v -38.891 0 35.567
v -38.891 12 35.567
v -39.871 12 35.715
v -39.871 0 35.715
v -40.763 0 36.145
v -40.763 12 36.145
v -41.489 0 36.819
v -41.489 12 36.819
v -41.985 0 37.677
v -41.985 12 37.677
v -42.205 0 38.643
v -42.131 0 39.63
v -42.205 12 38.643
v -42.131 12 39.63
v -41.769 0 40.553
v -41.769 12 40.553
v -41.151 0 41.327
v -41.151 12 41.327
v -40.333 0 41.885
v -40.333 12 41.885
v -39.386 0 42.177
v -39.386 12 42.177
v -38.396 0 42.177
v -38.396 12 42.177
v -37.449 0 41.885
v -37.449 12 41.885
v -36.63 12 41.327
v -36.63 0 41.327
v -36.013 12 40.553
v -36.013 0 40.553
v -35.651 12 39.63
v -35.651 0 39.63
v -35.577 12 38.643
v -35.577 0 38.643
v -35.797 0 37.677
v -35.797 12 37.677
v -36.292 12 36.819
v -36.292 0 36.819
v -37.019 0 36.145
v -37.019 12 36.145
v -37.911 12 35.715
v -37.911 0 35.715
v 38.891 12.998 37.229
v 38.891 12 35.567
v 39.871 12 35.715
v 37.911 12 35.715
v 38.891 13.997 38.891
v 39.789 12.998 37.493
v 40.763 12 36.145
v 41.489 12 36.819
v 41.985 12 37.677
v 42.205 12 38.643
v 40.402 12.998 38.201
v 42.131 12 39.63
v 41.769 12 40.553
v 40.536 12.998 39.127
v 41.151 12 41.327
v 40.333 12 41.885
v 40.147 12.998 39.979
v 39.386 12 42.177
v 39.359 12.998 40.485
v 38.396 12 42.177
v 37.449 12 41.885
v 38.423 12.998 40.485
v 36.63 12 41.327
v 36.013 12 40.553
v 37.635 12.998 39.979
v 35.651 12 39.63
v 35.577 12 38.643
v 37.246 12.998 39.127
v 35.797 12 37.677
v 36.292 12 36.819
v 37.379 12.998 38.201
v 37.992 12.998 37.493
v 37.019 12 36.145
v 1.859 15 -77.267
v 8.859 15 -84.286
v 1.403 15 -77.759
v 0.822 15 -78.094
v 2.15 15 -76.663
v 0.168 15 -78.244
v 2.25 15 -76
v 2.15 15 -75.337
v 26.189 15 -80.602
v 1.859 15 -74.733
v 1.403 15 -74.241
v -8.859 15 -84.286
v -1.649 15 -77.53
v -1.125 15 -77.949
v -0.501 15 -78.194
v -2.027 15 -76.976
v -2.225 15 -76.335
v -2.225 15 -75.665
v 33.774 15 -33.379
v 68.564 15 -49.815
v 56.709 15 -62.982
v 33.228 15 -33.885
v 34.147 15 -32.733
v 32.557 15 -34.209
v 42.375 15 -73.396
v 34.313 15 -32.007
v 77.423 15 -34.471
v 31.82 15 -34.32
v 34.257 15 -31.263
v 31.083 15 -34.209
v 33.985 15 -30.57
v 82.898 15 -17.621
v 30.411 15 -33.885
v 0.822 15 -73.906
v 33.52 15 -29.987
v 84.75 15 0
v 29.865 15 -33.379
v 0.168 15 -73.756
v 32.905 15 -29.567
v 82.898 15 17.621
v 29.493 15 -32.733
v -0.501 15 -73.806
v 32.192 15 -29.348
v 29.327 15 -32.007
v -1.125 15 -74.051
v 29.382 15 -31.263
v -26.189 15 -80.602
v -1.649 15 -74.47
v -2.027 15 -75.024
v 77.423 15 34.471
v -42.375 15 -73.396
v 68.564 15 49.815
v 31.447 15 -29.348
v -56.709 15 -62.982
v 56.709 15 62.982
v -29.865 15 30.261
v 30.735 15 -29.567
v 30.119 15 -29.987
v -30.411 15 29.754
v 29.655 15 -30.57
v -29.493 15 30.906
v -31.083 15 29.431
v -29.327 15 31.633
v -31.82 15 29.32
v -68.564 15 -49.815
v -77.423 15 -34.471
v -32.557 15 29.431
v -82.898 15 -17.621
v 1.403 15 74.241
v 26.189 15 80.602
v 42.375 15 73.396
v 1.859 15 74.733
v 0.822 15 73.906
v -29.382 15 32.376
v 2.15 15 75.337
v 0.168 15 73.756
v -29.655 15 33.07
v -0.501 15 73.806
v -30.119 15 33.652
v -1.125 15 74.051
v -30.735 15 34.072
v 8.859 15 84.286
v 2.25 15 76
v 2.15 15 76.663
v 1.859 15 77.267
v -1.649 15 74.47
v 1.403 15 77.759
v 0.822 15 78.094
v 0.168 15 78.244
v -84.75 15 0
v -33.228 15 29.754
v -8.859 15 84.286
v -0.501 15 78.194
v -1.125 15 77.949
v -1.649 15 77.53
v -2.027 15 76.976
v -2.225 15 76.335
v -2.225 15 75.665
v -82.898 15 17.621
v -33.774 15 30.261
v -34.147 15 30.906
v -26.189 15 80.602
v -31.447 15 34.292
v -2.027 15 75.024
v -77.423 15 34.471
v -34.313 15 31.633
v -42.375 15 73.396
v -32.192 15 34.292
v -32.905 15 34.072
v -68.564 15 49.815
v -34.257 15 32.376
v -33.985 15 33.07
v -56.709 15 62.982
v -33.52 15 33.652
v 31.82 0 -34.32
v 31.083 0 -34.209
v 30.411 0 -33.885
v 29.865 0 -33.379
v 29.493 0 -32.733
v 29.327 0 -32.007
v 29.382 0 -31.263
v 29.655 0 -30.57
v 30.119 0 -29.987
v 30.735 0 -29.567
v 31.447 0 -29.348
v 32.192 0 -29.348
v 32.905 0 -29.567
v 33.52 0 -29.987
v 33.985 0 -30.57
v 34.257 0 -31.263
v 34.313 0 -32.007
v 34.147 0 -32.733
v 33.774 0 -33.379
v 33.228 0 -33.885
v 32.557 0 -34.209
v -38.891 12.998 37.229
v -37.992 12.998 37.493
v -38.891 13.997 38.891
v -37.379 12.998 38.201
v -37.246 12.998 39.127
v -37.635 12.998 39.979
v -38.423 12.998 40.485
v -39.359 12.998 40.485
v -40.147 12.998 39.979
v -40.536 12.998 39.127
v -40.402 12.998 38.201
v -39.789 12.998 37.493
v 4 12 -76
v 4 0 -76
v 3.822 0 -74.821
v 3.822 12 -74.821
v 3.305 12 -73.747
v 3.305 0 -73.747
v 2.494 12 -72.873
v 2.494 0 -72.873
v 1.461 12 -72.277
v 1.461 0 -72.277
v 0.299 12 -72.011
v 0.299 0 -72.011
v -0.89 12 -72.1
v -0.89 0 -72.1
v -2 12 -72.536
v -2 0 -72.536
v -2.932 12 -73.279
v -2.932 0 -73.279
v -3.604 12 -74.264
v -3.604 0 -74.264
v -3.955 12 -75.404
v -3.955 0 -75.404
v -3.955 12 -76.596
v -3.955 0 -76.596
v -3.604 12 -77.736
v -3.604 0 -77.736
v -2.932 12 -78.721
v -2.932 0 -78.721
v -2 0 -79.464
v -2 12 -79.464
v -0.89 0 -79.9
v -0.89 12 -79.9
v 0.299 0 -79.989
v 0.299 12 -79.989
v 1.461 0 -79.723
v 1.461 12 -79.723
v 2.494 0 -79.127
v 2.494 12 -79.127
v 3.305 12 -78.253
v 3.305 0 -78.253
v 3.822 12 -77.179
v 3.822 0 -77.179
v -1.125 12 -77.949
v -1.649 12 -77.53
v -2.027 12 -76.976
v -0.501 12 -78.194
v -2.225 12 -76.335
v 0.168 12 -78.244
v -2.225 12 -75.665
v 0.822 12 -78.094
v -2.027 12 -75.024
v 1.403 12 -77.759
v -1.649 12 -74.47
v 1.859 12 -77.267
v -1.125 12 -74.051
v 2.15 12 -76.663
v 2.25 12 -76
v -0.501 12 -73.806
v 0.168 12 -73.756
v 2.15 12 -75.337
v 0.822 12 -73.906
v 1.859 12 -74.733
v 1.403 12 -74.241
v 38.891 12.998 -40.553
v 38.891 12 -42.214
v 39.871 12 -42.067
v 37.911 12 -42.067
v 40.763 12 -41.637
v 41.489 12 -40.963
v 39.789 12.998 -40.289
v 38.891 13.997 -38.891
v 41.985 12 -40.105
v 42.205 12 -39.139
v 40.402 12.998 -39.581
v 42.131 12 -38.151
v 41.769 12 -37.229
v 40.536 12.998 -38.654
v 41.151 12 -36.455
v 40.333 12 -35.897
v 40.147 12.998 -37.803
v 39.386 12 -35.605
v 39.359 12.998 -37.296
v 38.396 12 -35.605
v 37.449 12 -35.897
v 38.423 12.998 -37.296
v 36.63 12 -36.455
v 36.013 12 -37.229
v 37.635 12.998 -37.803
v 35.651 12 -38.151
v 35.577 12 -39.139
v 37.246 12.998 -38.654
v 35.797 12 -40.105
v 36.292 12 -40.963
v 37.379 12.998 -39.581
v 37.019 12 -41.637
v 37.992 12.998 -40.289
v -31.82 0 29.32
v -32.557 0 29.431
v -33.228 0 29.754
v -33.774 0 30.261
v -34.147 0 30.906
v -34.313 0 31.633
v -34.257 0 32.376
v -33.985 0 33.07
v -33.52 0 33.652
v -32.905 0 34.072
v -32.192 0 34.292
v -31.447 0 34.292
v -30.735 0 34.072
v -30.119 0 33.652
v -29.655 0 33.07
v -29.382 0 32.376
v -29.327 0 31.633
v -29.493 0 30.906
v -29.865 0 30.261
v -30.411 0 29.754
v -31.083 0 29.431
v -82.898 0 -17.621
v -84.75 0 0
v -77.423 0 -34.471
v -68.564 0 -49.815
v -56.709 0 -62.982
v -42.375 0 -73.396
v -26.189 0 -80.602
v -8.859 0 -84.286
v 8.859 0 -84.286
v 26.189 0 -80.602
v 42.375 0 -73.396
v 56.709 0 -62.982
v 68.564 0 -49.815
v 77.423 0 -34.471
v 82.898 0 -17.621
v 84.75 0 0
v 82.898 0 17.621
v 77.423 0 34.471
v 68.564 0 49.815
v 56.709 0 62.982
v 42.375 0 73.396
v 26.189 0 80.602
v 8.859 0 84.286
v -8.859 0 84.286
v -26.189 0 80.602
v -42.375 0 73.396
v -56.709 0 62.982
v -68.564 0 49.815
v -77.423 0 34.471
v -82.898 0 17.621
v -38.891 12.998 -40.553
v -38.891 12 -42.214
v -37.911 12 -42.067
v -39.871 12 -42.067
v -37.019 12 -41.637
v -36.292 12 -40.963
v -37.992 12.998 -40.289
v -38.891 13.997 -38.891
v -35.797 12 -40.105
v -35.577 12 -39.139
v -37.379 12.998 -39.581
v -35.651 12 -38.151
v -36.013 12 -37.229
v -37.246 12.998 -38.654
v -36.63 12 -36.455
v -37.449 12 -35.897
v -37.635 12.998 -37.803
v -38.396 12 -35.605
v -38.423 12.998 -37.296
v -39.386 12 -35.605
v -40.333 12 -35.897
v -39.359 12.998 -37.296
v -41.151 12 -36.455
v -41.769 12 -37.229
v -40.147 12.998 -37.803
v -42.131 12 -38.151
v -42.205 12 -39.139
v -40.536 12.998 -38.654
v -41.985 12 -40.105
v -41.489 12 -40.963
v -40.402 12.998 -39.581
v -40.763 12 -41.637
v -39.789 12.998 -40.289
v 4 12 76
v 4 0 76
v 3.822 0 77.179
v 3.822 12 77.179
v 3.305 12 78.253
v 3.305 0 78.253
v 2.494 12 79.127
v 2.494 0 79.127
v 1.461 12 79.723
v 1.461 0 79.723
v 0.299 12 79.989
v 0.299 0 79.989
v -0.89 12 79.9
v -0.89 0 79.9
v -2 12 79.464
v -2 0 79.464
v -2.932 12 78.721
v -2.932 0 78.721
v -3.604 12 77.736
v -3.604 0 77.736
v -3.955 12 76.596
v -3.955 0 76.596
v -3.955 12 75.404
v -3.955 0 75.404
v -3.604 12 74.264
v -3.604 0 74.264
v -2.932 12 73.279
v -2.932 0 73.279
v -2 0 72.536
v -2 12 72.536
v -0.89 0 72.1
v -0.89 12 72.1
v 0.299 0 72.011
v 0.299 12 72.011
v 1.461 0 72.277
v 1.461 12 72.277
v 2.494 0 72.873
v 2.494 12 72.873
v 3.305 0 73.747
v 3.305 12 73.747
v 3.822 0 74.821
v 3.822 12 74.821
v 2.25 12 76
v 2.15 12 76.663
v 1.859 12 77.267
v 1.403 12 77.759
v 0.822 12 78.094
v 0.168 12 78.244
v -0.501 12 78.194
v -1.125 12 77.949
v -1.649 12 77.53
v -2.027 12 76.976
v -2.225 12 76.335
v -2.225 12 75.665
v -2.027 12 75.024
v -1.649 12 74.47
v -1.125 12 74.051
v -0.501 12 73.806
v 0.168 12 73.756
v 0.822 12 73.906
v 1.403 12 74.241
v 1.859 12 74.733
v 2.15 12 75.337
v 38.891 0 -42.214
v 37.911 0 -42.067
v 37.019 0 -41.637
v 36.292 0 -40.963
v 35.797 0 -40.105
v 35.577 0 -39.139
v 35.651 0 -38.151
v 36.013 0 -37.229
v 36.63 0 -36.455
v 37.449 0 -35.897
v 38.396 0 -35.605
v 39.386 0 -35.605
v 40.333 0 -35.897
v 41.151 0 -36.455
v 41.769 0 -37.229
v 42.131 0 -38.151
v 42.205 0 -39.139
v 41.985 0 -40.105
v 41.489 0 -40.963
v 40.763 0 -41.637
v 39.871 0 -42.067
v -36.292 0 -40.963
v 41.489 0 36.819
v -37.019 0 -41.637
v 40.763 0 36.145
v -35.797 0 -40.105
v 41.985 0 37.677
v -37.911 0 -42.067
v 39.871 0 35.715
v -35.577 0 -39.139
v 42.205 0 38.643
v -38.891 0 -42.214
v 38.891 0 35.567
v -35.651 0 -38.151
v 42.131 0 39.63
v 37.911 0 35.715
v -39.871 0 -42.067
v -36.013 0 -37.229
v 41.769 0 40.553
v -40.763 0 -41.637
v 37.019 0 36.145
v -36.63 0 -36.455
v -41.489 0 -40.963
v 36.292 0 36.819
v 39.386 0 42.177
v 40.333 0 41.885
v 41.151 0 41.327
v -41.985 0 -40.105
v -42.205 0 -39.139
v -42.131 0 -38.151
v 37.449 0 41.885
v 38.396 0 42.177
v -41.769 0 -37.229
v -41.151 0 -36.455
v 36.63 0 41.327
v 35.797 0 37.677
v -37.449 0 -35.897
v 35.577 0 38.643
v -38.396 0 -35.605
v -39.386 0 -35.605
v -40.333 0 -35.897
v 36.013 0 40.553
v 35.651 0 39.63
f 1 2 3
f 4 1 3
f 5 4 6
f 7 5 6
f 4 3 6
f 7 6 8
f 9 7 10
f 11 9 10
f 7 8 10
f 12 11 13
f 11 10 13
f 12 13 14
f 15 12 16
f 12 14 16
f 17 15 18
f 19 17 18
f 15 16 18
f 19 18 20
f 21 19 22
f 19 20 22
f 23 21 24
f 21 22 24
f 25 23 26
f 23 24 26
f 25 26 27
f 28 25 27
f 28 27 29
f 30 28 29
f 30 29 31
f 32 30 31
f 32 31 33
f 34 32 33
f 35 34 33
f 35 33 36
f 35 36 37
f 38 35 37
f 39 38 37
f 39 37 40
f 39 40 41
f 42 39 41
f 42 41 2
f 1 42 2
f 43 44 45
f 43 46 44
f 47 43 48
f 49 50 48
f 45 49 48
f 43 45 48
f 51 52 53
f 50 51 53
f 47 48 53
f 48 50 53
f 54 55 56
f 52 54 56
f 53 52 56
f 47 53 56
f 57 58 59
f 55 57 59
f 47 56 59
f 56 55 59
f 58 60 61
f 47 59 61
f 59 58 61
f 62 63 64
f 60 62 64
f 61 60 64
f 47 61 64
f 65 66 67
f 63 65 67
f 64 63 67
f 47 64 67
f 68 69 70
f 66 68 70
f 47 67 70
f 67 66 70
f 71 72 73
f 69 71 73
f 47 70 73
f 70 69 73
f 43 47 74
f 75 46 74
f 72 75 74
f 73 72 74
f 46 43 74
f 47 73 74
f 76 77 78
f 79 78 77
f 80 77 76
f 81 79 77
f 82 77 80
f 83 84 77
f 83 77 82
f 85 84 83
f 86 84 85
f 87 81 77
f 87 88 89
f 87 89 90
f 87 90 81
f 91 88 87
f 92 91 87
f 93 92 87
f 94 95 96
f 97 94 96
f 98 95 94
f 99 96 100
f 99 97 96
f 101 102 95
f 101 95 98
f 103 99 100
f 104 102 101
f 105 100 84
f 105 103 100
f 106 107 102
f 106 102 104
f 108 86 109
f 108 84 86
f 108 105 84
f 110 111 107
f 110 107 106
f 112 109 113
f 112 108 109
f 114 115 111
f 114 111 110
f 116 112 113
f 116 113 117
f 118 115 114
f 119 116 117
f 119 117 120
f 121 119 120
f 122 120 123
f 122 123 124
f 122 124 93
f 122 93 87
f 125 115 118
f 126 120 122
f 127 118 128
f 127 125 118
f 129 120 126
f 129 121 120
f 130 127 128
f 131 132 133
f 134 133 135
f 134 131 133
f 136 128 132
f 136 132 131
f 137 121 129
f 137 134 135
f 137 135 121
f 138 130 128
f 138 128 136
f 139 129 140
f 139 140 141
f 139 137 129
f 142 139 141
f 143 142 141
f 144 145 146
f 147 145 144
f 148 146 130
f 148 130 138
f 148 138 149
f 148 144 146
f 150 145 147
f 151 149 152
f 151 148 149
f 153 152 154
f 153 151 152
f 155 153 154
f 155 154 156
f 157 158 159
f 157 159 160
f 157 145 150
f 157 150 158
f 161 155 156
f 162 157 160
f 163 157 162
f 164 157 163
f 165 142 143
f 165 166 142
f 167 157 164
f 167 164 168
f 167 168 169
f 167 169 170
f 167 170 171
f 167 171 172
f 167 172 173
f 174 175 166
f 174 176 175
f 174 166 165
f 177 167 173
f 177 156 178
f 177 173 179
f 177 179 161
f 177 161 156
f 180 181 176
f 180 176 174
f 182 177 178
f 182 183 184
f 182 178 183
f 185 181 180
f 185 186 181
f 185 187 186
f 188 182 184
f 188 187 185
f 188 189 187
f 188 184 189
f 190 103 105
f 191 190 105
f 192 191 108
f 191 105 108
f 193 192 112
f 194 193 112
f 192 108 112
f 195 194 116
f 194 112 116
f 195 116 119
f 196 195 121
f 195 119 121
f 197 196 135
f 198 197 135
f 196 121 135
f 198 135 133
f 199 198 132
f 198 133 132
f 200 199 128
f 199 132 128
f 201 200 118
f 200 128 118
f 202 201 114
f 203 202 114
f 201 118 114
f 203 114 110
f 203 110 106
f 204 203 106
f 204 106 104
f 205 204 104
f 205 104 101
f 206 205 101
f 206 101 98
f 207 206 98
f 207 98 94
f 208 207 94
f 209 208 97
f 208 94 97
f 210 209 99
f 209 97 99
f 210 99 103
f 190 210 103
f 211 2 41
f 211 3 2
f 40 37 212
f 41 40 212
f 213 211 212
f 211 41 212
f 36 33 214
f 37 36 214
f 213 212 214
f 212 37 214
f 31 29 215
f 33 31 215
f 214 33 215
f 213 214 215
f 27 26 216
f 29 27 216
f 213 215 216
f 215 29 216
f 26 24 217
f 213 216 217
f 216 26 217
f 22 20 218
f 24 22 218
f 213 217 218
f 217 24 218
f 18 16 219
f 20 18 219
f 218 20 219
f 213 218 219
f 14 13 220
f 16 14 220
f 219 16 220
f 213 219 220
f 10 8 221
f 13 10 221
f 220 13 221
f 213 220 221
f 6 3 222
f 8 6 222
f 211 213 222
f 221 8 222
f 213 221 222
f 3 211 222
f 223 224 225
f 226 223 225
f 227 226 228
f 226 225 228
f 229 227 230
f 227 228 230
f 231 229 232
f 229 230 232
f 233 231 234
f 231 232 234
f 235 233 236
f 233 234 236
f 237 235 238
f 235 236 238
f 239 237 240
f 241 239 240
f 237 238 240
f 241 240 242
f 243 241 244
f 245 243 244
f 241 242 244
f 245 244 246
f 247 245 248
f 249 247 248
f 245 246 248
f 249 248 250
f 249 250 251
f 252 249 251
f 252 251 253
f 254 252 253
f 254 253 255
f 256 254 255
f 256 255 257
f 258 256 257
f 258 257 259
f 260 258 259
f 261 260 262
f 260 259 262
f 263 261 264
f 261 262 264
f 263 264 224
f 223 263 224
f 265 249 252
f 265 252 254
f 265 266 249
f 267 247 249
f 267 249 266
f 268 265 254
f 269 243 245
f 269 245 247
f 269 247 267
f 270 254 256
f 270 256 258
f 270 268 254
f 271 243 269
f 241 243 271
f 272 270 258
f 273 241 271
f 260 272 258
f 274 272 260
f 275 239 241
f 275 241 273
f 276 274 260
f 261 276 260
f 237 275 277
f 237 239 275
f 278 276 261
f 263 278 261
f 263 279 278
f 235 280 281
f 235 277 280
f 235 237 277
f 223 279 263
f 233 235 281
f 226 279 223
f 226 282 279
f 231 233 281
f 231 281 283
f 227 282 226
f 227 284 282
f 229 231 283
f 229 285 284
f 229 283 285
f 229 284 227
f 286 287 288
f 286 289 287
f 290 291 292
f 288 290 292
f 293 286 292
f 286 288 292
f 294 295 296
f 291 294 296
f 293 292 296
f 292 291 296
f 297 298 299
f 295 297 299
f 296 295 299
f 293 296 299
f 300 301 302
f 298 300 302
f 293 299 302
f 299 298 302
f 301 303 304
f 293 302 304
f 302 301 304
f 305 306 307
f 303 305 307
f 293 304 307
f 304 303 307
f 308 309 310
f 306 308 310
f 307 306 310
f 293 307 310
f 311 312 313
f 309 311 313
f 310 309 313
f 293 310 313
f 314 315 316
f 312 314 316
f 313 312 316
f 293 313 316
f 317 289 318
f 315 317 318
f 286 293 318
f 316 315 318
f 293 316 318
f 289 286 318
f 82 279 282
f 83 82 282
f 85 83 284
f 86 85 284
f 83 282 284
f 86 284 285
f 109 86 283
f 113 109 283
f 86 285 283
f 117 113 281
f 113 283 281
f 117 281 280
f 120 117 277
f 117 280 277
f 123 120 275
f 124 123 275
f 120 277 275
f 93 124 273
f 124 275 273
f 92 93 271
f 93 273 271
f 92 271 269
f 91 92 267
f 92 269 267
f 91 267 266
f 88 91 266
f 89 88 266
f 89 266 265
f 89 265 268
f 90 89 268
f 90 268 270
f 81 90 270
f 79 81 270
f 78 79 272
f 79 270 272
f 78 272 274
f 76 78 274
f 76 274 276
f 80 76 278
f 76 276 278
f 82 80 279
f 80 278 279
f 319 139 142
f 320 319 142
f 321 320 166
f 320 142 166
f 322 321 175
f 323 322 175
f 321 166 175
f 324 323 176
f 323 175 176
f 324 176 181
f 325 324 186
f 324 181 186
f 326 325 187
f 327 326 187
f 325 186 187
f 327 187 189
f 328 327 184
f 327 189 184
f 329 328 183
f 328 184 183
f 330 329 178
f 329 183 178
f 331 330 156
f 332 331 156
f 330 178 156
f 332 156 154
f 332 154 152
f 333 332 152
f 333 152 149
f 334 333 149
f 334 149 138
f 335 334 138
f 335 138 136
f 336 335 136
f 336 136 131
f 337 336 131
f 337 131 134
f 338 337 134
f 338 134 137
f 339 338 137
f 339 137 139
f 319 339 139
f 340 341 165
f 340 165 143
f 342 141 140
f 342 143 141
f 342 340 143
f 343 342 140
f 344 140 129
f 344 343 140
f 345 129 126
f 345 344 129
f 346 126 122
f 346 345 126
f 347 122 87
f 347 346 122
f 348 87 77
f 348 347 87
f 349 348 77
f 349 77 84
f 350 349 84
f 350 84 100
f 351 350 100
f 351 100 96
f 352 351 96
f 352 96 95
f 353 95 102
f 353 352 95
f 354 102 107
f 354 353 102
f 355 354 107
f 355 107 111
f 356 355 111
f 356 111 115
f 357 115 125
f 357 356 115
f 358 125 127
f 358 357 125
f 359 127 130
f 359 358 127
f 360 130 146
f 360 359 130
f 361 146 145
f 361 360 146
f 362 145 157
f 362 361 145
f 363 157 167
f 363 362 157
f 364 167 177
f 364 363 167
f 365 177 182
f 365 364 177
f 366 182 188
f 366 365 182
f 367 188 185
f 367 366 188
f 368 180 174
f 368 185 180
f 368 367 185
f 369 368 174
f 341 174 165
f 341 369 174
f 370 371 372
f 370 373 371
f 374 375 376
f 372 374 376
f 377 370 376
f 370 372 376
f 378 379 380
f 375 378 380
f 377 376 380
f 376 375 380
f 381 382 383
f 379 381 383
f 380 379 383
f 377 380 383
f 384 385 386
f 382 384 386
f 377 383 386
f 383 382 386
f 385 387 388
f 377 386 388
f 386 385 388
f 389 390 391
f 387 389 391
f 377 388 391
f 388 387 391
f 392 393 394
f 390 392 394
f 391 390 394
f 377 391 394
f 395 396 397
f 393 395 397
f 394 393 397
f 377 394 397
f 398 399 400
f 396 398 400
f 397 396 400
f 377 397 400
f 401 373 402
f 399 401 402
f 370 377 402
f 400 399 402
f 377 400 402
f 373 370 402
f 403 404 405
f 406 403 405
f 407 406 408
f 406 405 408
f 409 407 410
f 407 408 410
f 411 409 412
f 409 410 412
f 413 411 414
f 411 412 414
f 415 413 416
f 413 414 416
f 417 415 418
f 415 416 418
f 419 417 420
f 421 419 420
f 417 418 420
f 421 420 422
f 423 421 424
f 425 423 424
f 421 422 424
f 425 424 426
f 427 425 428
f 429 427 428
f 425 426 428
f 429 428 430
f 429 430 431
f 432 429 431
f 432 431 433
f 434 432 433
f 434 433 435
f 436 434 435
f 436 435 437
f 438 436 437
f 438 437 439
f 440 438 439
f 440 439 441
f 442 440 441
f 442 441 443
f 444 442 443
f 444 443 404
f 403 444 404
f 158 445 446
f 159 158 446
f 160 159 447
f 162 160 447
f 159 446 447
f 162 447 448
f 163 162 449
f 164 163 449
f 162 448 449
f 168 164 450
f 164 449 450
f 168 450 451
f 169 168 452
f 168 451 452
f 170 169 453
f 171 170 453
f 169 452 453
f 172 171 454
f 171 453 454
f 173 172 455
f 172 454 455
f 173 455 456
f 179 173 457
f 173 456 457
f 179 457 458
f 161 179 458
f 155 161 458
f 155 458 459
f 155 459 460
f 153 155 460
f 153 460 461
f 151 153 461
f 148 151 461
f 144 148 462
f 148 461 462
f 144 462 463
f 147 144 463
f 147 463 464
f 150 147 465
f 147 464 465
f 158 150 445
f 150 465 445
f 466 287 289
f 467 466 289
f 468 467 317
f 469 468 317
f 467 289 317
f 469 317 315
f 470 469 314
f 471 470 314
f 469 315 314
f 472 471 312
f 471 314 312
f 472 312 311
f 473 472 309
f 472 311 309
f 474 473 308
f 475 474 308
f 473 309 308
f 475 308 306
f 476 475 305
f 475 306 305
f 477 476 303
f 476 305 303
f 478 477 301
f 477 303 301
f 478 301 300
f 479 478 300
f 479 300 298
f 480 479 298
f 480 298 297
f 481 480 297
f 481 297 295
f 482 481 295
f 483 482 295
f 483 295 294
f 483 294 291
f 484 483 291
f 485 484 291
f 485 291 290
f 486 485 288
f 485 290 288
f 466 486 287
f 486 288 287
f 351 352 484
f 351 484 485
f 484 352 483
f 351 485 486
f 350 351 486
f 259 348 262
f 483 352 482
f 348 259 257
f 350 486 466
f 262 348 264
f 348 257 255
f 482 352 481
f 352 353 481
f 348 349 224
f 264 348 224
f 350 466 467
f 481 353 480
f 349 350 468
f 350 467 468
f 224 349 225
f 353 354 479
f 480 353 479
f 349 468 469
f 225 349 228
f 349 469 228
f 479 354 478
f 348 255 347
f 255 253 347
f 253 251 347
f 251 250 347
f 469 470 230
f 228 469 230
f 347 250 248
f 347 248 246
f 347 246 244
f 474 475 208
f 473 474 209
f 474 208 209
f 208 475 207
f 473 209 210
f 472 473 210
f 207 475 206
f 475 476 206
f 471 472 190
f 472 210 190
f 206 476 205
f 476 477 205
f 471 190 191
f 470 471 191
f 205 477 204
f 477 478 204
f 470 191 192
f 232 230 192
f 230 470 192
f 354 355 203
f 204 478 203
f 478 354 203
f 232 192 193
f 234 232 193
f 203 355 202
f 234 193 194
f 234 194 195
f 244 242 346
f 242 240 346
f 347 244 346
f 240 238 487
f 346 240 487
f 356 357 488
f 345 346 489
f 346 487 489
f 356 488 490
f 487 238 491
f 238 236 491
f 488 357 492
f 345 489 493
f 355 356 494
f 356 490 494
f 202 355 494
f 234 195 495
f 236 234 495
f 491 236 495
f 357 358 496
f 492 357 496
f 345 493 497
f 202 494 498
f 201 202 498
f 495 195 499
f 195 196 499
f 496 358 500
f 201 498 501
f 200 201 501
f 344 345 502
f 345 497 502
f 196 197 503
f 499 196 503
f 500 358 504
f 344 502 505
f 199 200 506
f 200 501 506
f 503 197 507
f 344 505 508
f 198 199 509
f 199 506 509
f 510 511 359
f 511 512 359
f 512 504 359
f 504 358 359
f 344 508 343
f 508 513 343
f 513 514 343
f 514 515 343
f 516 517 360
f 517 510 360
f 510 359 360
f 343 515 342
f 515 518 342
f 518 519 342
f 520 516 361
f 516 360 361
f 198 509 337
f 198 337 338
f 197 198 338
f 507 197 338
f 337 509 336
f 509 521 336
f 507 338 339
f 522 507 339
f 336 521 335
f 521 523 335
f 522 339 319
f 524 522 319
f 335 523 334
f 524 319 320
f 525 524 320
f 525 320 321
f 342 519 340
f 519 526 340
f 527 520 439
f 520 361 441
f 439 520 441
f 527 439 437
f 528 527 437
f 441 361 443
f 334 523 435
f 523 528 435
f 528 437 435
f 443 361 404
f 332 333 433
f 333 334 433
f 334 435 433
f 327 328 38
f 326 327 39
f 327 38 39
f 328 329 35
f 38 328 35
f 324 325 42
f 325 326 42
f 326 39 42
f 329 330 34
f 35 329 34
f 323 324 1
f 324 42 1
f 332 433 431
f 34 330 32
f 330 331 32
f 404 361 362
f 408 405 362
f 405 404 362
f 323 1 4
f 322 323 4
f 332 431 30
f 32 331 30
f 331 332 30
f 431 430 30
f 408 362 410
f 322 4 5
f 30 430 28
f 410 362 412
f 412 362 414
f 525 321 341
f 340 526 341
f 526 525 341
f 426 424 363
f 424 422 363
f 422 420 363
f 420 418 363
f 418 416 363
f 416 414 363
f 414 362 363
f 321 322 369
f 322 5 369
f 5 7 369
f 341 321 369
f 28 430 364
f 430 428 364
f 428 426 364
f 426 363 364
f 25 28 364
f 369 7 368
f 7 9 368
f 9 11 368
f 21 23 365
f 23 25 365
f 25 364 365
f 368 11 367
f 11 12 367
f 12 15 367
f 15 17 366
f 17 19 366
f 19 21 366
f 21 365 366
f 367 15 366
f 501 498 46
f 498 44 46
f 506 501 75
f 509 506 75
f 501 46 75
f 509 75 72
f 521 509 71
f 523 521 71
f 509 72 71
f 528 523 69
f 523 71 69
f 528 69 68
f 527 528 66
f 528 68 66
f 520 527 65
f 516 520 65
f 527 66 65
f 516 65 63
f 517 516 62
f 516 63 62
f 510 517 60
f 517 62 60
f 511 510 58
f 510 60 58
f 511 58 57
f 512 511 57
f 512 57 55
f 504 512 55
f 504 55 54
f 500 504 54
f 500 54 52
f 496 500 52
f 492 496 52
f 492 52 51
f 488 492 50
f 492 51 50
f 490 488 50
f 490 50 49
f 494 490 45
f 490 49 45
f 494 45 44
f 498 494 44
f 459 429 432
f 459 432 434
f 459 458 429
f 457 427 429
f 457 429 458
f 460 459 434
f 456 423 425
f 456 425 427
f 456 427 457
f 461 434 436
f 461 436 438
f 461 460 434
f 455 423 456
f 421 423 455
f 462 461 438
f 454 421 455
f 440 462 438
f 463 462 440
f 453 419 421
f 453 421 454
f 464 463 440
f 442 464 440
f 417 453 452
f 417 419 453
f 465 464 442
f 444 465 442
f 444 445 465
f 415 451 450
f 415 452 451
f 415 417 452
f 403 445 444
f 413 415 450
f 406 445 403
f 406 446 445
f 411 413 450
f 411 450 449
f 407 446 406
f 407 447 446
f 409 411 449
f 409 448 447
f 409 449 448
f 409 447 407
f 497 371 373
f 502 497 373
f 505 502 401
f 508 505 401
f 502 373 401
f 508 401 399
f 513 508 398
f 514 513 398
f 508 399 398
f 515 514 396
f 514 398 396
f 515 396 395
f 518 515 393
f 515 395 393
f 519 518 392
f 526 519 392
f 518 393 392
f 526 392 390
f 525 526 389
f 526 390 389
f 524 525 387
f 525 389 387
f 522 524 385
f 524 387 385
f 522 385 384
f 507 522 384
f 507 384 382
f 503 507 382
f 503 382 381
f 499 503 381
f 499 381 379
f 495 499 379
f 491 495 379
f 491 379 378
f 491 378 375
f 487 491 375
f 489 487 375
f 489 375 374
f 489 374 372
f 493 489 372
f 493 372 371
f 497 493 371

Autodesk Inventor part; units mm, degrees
ref_plane "YZ Plane" through (0, 0, 0) normal (1, 0, 0) x (0, 1, 0)
ref_plane "XZ Plane" through (0, 0, 0) normal (0, 1, 0) x (-1, 0, 0)
ref_plane "XY Plane" through (0, 0, 0) normal (0, 0, 1) x (1, 0, 0)
sketch "Sketch1" plane through (0, 0, 0) normal (0, 1, 0) x (-1, 0, 0)
  circle A0 centre (0, 0) radius 84.75
  dimension "d0" = 169.5
extrude "Extrusion1" add sketch "Sketch1" along normal blind 15
sketch "Sketch2" plane through (0, 0, 0) normal (0, -1, 0) x (1, 0, 0)
  circle A0 centre (0, 0) radius 76
  circle A1 centre (0, 76) radius 4
  circle A2 centre (0, -76) radius 4
  circle A3 centre (0, 76) radius 2.25
  circle A4 centre (0, -76) radius 2.25
  dimension "d3" = 152
  dimension "d4" = 8
  dimension "d5" = 8
  dimension "d6" = 4.5
  dimension "d7" = 4.5
extrude "Extrusion2" cut sketch "Sketch2" against normal through all contours A3 A0 | A0 A3 | A4 A0 | A0 A4
extrude "Extrusion3" cut sketch "Sketch2" against normal blind 12 contours A1 A0 A3 | A0 A3 A1 | A2 A0 A4 | A0 A4 A2 | A3 A0 | A0 A3 | A4 A0 | A0 A4
sketch "Sketch3" plane through (0, 0, 0) normal (0, -1, 0) x (1, 0, 0)
  circle A0 centre (0, 0) radius 84.75
  circle A1 centre (0, 0) radius 20
  circle A2 centre (0, -20) radius 4
  circle A3 centre (20, 0) radius 4
  circle A4 centre (0, 20) radius 4
  circle A5 centre (-20, 0) radius 4
  line L0 (55, 55) -> (-55, 55)
  line L1 (-55, 55) -> (-55, -55)
  line L2 (-55, -55) -> (55, -55)
  line L3 (55, -55) -> (55, 55)
  line L4 (55, 55) -> (-55, -55) construction
  line L5 (-55, 55) -> (55, -55) construction
  circle A6 centre (0, 0) radius 55
  circle A7 centre (-38.8909, -38.8909) radius 4
  circle A8 centre (38.8909, -38.8909) radius 4
  circle A9 centre (38.8909, 38.8909) radius 4
  circle A10 centre (-38.8909, 38.8909) radius 4
  dimension "d12" = 40
  dimension "d13" = 8
  dimension "d16" = 360
  dimension "d21" = 110
  dimension "d22" = 110
  dimension "d23" = 110
  dimension "d24" = 8
  dimension "d25" = 8
  dimension "d26" = 8
  dimension "d27" = 8
hole "Hole1" at (38.8909, 0, -38.8909) at (38.8909, 0, 38.8909) at (-38.8909, 0, 38.8909) at (-38.8909, 0, -38.8909) direction (0, 1, 0) diameter 6.647 depth 12 tip angle 118 thread size "M8x1.25" class "6H" standard "ANSI Metric M Profile"
sketch "Sketch4" plane through (0, 0, 0) normal (0, -1, 0) x (1, 0, 0)
  circle A0 centre (0, 0) radius 45
  circle A1 centre (-45, 0) radius 2.5
  circle A2 centre (-41.5746, -17.2208) radius 2.5
  circle A3 centre (-31.8198, -31.8198) radius 2.5
  circle A4 centre (-17.2208, -41.5746) radius 2.5
  circle A5 centre (0, -45) radius 2.5
  circle A6 centre (17.2208, -41.5746) radius 2.5
  circle A7 centre (31.8198, -31.8198) radius 2.5
  circle A8 centre (41.5746, -17.2208) radius 2.5
  circle A9 centre (45, 0) radius 2.5
  circle A10 centre (41.5746, 17.2208) radius 2.5
  circle A11 centre (31.8198, 31.8198) radius 2.5
  circle A12 centre (17.2208, 41.5746) radius 2.5
  circle A13 centre (0, 45) radius 2.5
  circle A14 centre (-17.2208, 41.5746) radius 2.5
  circle A15 centre (-31.8198, 31.8198) radius 2.5
  circle A16 centre (-41.5746, 17.2208) radius 2.5
  dimension "d35" = 90
  dimension "d36" = 5
  dimension "d39" = 360
hole "Hole2" at (-31.8198, 0, 31.8198) at (31.8198, 0, -31.8198) direction (0, 1, 0) diameter 5 end through all
properties part number "substrate plate"
